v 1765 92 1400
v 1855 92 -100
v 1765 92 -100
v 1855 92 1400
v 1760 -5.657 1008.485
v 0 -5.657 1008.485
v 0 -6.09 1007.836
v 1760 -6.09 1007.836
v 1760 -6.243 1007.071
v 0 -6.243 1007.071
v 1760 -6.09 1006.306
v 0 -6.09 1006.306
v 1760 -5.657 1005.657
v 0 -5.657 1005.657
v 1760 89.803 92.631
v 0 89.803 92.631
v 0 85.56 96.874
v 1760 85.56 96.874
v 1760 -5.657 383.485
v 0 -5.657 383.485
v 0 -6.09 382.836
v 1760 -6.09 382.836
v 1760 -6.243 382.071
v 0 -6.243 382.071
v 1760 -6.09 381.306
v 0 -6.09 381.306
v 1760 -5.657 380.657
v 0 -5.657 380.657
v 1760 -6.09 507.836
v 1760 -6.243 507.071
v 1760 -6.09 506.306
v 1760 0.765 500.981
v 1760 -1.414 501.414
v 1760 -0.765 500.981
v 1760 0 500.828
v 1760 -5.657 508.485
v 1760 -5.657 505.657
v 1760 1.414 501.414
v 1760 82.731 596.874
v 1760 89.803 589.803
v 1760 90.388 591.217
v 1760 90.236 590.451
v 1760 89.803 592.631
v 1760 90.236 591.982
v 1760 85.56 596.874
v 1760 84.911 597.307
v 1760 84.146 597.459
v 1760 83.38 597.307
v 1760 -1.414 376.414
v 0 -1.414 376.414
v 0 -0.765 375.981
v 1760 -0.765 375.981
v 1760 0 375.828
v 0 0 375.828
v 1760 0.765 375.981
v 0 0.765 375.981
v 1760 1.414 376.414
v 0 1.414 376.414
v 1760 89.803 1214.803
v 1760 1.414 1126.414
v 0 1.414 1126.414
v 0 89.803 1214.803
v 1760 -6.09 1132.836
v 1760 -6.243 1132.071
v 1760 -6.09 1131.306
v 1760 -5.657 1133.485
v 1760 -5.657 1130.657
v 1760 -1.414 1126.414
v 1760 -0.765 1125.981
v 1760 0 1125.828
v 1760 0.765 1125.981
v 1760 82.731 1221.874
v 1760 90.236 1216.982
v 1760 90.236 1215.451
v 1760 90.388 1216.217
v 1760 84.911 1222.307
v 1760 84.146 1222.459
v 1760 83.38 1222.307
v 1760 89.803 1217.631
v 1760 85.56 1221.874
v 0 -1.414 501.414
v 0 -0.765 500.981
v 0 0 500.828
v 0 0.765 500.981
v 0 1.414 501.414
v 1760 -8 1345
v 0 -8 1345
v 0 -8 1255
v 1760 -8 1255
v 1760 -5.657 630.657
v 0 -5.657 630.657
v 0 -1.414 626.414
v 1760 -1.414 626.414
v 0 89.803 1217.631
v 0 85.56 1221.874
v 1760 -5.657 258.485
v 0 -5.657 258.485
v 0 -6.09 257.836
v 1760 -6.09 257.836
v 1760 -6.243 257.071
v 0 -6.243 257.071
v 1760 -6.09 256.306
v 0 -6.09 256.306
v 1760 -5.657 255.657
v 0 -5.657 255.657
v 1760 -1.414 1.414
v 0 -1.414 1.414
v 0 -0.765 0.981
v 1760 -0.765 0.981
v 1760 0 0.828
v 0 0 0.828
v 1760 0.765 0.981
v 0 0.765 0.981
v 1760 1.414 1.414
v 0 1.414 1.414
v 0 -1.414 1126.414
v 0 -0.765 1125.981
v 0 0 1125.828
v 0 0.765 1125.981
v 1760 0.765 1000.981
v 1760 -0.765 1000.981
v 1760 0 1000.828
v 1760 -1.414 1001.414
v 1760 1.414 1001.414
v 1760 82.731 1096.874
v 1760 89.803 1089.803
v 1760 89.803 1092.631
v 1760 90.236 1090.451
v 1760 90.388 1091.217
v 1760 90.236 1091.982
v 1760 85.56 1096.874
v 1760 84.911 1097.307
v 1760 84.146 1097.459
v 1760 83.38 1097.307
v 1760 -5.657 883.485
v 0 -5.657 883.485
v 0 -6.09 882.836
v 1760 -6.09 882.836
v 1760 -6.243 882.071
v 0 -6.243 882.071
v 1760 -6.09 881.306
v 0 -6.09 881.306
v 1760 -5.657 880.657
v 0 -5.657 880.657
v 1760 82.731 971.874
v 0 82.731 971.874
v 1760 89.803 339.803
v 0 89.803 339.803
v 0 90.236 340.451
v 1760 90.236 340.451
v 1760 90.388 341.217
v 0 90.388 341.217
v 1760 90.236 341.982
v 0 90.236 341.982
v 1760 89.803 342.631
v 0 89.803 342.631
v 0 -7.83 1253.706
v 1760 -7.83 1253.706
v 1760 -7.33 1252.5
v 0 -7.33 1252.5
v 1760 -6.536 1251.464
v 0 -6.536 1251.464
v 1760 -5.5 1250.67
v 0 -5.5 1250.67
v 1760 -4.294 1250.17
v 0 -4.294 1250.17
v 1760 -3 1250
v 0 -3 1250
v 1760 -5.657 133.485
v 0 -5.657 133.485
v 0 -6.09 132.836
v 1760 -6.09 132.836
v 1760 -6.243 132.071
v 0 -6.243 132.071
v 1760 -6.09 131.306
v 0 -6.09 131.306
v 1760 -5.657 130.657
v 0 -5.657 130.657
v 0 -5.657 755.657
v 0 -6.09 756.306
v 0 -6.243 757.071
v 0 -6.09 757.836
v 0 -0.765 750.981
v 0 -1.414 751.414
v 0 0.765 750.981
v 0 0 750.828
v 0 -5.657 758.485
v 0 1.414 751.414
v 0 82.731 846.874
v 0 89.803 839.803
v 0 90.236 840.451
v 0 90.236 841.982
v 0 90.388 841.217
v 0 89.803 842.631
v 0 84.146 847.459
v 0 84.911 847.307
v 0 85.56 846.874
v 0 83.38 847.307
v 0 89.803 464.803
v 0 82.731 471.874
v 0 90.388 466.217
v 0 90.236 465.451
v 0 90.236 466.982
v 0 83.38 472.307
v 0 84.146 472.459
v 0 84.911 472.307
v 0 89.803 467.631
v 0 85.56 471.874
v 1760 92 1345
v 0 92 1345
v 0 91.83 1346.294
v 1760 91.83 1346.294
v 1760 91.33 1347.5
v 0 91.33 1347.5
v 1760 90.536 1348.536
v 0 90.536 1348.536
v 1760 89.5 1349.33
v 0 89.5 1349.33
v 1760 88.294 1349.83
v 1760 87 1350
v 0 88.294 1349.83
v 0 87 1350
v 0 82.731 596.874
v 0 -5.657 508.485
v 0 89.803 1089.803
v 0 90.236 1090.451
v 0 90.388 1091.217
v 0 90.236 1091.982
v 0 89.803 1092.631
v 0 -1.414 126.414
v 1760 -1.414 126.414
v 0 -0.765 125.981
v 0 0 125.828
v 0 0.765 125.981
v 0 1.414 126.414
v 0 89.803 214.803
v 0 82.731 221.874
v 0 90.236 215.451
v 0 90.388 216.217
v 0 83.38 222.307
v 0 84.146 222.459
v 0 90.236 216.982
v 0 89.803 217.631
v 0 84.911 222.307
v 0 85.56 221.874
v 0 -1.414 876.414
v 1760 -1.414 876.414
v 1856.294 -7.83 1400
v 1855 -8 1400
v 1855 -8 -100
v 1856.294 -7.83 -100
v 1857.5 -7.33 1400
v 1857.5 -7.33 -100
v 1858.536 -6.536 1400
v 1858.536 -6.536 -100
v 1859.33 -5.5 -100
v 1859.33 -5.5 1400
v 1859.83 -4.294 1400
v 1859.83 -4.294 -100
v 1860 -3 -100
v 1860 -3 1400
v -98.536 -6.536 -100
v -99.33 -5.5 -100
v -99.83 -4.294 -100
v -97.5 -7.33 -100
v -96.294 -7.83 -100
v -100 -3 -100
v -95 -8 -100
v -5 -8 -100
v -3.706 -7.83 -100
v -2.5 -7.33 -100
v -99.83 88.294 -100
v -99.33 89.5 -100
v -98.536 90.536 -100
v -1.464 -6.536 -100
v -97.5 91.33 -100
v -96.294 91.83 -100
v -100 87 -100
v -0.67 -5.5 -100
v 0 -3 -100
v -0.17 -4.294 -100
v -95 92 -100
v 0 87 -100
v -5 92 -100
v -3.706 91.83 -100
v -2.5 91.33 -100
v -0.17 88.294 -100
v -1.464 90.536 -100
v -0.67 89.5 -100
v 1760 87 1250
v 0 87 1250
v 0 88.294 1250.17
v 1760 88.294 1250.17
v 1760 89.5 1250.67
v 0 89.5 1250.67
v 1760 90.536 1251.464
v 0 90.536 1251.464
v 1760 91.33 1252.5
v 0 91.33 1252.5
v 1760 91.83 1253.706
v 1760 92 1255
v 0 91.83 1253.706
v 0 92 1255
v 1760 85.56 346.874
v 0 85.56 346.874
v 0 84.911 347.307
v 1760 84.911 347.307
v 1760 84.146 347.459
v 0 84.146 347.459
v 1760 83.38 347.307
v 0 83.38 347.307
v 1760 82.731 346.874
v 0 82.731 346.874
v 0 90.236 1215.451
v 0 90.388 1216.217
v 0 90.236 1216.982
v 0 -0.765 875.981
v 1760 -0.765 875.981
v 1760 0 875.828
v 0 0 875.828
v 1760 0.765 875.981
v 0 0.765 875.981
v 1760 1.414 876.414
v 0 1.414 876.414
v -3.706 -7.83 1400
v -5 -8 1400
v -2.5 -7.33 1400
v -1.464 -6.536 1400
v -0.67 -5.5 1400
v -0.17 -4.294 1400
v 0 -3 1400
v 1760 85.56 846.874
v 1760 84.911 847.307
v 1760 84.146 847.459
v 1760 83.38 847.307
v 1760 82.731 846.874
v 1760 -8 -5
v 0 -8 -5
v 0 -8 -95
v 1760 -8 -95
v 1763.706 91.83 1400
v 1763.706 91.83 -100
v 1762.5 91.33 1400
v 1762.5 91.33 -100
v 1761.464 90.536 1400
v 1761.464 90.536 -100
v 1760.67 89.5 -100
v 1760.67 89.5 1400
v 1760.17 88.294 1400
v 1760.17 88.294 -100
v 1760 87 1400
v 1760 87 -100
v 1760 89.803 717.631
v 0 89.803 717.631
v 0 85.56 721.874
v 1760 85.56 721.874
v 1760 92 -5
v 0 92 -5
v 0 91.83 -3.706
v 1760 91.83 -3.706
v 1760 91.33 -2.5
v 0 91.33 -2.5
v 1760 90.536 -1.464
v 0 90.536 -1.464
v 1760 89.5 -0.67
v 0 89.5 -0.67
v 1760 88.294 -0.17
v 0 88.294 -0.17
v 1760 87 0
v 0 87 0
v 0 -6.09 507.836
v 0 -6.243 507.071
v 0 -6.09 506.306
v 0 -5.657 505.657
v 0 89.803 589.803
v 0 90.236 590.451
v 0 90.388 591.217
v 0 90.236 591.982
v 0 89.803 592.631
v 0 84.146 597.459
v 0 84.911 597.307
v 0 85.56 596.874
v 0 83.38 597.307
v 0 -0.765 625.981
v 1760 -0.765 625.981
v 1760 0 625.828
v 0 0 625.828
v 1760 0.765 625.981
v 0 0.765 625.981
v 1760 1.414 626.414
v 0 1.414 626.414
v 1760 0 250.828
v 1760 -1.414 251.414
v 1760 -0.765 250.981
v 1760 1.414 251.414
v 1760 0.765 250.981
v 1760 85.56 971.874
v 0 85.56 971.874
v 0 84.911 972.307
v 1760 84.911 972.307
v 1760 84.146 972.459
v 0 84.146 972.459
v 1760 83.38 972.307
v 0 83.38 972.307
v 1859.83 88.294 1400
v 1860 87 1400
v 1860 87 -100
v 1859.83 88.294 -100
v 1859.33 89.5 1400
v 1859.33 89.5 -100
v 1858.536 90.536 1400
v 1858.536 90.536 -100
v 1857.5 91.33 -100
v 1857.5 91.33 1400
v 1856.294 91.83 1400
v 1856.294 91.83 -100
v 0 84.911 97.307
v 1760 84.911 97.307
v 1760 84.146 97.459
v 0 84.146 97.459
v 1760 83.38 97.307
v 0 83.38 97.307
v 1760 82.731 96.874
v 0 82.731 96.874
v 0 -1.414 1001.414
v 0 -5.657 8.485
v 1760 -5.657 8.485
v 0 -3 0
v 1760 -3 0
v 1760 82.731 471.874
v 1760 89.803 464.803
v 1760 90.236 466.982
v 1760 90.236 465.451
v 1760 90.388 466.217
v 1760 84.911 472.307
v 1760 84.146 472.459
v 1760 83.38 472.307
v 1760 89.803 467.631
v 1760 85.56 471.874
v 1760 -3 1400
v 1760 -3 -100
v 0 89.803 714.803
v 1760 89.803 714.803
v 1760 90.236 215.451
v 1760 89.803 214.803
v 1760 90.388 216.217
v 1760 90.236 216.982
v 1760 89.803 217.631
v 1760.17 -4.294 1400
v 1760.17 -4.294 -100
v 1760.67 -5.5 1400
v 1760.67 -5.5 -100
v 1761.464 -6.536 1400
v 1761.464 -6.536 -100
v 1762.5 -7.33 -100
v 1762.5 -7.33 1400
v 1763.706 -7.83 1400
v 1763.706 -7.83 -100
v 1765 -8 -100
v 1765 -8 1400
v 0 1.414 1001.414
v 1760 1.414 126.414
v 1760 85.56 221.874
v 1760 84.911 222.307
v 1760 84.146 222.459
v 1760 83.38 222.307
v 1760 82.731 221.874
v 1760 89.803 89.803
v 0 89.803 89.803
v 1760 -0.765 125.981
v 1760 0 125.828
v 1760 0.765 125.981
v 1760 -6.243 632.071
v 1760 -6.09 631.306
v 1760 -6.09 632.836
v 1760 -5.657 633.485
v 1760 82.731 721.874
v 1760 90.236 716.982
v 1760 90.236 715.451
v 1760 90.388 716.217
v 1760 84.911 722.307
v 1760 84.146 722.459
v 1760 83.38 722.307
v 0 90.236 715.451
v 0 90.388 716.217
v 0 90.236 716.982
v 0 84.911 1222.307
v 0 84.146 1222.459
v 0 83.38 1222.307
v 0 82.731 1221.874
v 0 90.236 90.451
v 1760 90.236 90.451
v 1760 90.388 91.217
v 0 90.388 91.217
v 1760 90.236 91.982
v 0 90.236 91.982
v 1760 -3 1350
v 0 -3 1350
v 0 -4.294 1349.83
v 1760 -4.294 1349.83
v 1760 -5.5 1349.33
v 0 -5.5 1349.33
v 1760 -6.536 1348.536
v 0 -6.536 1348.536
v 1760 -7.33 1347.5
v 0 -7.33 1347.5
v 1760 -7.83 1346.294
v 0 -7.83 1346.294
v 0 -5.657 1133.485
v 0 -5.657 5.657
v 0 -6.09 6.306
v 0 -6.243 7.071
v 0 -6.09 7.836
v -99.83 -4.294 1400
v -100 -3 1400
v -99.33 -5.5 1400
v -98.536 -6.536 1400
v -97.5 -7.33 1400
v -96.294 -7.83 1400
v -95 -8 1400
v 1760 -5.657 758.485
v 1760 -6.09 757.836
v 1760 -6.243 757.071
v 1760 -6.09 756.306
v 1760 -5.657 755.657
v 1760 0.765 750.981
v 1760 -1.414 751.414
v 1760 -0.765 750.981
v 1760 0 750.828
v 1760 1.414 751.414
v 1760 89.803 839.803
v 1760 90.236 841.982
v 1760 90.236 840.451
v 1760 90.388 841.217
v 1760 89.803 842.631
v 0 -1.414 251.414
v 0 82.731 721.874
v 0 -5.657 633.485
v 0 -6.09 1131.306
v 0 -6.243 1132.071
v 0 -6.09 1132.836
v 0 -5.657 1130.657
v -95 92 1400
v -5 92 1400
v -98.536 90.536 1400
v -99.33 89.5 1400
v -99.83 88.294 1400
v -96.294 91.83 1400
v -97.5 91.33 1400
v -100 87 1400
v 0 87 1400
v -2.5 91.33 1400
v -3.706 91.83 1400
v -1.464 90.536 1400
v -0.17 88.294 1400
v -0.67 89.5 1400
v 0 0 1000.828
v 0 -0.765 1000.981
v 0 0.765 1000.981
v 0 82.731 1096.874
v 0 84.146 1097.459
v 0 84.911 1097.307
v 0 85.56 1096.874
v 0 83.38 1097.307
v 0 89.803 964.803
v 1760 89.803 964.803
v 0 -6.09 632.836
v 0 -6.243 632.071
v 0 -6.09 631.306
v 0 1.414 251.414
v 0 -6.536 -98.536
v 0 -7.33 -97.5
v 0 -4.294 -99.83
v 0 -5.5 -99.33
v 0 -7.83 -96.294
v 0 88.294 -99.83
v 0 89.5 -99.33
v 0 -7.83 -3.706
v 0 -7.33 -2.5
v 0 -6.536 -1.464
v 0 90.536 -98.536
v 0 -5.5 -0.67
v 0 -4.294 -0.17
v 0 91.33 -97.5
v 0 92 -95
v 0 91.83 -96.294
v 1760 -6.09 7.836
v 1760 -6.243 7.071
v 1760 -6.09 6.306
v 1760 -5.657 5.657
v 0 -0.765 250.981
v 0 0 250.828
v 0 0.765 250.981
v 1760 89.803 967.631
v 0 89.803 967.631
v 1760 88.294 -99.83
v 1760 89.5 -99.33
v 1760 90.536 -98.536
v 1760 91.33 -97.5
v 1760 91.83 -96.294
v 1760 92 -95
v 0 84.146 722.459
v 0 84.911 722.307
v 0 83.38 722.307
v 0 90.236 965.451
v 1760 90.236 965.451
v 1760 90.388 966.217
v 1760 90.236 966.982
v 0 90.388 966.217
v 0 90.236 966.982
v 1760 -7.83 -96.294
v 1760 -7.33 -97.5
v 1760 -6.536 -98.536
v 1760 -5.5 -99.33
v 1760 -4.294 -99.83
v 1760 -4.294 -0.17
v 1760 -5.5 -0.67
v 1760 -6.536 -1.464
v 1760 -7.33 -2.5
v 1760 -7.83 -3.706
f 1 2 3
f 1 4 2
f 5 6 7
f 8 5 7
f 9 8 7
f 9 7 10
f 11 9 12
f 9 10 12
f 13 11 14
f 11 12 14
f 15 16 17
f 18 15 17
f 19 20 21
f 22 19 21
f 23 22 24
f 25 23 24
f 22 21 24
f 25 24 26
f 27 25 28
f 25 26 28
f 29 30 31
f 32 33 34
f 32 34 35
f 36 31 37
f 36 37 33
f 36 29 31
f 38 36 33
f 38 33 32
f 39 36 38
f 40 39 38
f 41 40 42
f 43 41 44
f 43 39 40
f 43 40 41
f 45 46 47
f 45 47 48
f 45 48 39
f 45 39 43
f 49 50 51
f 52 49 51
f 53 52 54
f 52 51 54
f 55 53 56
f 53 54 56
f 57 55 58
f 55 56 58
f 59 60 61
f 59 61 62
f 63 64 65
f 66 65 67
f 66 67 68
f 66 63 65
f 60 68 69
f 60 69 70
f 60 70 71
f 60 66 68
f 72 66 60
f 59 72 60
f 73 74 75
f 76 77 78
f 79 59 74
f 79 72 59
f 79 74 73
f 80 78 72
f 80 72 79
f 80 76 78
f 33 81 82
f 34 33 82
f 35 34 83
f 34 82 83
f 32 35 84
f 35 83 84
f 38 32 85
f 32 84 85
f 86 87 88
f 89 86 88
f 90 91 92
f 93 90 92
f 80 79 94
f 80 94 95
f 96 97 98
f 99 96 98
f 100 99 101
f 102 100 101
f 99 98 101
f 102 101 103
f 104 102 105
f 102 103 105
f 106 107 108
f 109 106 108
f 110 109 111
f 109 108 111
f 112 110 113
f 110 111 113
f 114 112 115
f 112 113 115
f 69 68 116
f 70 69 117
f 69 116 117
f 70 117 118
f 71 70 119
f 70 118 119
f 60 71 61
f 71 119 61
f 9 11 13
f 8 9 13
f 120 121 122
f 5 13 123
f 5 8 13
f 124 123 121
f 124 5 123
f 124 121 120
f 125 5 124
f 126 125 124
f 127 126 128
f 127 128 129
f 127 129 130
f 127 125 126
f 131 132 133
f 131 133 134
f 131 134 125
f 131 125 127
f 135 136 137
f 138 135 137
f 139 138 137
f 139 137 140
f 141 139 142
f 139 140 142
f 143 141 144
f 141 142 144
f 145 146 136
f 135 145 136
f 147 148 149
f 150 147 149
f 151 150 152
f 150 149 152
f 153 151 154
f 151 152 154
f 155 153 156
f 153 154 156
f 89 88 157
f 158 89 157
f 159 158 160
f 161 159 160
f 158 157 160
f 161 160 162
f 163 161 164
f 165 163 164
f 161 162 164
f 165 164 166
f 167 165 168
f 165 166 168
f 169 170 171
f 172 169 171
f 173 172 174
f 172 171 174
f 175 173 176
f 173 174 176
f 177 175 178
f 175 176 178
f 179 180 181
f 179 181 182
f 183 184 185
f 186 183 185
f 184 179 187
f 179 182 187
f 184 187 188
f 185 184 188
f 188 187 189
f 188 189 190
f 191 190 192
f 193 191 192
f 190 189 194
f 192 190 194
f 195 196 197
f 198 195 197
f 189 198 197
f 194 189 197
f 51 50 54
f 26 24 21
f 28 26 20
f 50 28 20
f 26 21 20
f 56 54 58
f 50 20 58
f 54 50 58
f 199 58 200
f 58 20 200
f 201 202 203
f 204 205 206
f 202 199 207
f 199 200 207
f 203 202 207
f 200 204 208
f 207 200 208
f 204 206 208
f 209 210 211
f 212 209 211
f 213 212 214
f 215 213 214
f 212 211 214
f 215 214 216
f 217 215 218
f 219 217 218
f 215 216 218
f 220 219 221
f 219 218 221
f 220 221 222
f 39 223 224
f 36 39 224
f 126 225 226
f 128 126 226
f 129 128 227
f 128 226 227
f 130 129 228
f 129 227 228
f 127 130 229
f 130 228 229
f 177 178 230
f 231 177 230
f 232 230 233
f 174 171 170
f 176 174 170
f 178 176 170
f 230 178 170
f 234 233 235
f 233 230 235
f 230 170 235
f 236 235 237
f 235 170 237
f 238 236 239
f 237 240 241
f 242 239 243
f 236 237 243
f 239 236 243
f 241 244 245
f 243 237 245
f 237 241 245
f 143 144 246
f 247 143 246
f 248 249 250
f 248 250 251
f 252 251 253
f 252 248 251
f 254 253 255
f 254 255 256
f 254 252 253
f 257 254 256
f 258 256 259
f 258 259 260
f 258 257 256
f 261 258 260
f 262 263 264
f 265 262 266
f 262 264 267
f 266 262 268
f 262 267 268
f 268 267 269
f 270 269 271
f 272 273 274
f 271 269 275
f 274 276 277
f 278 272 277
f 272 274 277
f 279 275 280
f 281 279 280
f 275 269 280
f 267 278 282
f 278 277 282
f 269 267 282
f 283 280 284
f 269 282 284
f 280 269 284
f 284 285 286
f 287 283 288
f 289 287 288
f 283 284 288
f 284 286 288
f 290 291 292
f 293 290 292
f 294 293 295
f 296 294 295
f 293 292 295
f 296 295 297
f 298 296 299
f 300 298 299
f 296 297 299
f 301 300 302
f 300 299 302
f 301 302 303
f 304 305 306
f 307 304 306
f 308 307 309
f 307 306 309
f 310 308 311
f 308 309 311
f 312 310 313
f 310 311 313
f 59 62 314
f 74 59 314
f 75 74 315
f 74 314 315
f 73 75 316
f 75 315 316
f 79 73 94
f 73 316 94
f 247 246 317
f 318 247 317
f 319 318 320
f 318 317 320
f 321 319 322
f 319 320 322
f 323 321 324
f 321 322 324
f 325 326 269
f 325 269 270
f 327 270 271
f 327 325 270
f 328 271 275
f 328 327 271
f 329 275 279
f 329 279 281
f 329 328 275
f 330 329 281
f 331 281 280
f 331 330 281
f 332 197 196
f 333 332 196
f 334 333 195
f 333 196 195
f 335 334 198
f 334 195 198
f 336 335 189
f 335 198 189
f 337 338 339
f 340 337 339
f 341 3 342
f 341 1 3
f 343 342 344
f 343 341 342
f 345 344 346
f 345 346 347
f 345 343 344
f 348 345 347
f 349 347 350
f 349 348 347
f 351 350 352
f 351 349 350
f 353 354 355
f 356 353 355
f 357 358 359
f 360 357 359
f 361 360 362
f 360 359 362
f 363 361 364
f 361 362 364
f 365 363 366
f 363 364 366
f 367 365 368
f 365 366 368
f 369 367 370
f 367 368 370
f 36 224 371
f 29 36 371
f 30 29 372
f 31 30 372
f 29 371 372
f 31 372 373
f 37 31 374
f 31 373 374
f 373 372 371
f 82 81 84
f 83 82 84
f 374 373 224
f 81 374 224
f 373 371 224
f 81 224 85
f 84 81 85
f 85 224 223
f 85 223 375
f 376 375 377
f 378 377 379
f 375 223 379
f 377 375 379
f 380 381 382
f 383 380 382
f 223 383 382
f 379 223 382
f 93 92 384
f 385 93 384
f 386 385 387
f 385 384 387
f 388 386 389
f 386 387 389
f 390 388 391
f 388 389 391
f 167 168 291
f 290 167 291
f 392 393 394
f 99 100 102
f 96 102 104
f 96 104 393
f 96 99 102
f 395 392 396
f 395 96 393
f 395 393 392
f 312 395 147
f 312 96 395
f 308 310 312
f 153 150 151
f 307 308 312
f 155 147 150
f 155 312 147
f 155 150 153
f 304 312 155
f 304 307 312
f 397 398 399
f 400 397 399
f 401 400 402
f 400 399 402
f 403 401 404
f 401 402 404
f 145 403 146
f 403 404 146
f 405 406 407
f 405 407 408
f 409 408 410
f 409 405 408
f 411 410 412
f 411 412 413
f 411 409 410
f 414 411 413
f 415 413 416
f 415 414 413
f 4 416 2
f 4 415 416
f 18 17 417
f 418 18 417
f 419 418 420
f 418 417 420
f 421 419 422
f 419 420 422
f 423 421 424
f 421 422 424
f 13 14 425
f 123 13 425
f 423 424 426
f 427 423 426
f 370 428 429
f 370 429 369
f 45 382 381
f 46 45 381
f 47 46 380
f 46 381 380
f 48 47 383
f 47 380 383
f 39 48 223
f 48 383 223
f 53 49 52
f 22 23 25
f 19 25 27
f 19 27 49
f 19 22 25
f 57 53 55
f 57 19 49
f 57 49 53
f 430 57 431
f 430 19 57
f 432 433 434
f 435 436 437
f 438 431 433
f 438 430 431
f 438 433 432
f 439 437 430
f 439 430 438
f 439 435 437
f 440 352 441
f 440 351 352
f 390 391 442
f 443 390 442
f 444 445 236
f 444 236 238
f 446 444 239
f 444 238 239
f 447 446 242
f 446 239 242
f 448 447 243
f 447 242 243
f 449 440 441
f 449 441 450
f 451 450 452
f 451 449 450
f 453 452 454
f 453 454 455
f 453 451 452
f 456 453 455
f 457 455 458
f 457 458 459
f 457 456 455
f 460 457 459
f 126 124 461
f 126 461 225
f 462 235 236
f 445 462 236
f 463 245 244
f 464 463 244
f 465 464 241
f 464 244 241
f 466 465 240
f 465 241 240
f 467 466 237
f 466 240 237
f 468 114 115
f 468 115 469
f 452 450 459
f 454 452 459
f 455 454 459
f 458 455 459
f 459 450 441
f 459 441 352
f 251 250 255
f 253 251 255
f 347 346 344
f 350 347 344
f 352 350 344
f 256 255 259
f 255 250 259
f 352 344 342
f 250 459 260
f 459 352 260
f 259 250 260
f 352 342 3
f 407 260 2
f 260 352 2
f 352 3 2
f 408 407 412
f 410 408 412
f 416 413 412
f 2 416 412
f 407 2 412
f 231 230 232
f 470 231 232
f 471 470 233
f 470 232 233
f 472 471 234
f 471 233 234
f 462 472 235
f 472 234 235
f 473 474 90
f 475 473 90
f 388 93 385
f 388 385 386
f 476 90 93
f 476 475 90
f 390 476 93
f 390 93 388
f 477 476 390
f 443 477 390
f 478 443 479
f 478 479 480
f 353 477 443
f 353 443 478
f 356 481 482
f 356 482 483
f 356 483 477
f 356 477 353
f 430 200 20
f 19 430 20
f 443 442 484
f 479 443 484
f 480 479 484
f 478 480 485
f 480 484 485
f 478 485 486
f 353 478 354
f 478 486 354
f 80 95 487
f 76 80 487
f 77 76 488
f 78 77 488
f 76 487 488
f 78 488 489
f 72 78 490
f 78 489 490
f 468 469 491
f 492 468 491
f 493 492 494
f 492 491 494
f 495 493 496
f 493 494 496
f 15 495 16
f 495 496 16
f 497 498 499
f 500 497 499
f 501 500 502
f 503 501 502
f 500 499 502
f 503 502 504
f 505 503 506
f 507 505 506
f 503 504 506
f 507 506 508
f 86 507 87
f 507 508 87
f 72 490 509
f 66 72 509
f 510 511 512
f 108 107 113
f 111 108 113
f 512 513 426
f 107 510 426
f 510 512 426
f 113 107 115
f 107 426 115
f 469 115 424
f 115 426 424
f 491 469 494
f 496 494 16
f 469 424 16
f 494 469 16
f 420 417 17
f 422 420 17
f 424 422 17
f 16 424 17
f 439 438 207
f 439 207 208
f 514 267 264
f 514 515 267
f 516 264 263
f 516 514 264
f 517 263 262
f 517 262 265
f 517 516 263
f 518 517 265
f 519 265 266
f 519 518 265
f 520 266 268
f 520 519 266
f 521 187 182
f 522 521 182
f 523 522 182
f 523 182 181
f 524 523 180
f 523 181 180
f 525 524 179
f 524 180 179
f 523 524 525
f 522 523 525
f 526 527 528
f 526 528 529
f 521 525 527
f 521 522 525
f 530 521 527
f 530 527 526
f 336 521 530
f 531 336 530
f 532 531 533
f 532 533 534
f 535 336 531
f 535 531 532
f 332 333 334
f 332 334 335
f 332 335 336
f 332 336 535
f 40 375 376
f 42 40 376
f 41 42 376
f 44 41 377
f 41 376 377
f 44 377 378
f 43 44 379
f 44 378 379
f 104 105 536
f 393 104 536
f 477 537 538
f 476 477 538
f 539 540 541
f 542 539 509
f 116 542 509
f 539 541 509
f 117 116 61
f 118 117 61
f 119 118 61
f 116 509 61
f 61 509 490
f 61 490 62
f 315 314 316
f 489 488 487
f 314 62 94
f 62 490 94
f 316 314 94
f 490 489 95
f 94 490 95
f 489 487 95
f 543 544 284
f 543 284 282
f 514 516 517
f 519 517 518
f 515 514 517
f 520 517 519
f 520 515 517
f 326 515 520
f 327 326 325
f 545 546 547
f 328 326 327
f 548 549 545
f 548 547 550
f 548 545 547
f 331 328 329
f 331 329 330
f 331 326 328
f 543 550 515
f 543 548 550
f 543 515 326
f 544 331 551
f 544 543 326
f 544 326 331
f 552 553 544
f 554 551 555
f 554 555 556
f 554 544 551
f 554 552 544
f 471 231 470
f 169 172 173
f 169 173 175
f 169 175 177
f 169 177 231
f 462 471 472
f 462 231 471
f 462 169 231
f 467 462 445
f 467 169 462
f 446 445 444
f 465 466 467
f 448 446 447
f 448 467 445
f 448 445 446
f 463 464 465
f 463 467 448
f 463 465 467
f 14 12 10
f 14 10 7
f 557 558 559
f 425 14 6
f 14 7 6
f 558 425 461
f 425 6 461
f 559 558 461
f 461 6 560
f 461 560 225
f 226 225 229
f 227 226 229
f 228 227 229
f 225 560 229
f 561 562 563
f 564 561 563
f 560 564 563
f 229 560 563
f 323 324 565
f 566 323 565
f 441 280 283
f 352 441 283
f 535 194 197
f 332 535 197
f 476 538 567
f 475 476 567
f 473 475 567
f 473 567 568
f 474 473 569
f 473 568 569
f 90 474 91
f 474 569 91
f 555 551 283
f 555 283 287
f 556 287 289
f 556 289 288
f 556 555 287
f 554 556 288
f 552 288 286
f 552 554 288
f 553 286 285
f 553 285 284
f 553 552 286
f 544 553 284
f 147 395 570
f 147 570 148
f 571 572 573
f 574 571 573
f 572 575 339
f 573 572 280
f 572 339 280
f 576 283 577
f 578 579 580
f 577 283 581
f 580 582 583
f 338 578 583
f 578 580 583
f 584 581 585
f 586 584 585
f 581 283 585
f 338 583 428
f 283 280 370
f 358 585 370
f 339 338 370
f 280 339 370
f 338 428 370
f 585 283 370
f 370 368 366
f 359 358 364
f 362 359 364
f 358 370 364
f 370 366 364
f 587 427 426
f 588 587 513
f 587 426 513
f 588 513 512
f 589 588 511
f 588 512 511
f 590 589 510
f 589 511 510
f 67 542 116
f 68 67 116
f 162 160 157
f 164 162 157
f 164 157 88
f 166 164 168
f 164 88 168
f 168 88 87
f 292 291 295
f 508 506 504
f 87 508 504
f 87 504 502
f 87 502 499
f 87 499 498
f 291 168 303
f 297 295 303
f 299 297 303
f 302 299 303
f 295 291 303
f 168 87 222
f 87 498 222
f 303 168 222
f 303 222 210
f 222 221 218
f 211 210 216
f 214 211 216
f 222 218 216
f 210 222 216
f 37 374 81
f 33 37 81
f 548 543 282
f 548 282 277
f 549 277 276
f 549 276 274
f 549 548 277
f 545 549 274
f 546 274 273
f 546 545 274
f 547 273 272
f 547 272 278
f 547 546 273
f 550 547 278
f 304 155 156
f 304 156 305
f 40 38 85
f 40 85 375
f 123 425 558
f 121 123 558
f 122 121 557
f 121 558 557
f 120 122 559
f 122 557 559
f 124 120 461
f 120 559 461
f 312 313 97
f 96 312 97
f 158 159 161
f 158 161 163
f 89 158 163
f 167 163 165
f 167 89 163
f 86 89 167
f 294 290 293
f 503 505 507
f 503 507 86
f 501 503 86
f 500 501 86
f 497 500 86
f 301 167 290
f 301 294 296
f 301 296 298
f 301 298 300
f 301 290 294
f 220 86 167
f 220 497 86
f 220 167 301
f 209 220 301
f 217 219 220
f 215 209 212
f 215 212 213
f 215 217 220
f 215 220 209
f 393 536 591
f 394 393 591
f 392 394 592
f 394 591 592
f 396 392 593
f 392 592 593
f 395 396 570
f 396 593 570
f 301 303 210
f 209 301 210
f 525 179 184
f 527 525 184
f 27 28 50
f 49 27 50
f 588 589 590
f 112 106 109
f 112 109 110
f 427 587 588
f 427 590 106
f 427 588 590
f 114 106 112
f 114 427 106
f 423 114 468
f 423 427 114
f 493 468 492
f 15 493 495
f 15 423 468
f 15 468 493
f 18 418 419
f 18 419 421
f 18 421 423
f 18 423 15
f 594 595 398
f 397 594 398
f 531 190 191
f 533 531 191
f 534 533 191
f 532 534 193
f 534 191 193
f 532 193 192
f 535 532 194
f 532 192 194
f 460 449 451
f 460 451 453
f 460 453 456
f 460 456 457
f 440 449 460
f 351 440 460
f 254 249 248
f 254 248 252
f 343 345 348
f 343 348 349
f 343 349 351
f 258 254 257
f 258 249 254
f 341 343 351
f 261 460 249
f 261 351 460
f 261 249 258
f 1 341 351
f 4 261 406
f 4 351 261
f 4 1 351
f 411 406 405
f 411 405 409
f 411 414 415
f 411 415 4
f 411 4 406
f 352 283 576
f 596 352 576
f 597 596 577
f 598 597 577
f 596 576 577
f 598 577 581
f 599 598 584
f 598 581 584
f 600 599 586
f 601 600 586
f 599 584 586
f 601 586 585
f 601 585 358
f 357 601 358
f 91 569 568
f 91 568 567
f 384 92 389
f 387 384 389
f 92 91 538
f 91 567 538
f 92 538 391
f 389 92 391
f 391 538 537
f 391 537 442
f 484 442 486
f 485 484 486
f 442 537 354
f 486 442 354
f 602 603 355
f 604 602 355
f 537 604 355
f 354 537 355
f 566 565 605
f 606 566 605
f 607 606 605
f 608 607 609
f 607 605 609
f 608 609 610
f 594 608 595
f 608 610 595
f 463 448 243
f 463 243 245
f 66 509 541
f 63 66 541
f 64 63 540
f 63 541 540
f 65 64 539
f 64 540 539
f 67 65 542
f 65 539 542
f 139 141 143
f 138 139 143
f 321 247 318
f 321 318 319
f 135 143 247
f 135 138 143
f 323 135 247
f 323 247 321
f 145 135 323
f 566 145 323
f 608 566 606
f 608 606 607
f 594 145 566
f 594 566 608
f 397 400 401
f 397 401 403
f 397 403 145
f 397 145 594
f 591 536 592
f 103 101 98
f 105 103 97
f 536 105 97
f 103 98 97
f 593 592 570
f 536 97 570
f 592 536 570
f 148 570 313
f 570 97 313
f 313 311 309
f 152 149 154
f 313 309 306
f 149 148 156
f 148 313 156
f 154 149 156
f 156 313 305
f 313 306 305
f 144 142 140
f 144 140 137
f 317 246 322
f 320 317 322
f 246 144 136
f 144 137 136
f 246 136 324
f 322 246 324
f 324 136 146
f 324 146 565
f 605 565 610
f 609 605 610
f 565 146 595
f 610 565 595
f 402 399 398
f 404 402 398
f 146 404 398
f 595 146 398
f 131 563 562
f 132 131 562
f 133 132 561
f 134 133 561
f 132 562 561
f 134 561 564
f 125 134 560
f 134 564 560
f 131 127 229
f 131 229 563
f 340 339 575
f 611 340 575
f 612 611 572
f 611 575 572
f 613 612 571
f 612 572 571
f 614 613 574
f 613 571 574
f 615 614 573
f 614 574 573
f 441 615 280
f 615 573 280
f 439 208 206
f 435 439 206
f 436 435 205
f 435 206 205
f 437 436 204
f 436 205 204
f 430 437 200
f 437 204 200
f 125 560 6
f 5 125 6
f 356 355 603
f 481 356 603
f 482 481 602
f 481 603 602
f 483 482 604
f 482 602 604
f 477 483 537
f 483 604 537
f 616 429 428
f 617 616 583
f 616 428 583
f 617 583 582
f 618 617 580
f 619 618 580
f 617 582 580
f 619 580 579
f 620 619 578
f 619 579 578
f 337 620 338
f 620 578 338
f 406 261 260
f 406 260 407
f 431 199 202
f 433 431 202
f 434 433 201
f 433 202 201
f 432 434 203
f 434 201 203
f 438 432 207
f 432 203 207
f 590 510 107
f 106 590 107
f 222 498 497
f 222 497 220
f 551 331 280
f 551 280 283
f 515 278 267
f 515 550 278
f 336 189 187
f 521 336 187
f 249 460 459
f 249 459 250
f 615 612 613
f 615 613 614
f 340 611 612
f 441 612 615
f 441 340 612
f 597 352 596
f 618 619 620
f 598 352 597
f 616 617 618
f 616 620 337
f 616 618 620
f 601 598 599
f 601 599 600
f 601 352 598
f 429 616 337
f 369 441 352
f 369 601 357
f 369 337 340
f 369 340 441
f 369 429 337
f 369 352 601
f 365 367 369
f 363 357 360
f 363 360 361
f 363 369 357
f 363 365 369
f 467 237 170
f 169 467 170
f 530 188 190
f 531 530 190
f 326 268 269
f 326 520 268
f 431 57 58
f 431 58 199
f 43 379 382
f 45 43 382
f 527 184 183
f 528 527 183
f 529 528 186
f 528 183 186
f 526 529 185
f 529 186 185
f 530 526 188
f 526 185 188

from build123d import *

# Parameters (mm, degrees)
F1_DEPTH      = 1760
F3_DEPTH      = 1400
F3_DEPTH_BACK = 100
F4_W          = 90
F4_H          = 100
F5_DEPTH      = 1760


# Not quite as in the source:
# - a feature names something its author has since deleted; it is built from what else it names


with BuildPart() as f1:
    # F0 (on Right) → F1 (new body)
    with BuildSketch(Plane.YZ):
        with BuildLine():
            ThreePointArc((-1.4142135624, 1.4142135624), (0, 0.8284271247), (1.4142135624, 1.4142135624))
            Line((1.4142135624, 1.4142135624), (89.8025612107, 89.8025612107))
            ThreePointArc((89.8025612107, 89.8025612107), (90.3883476483, 91.2167747731), (89.8025612107, 92.6309883354))
            Line((89.8025612107, 92.6309883354), (85.5599205236, 96.8736290226))
            ThreePointArc((85.5599205236, 96.8736290226), (84.1457069612, 97.4594154602), (82.7314933988, 96.8736290226))
            Line((82.7314933988, 96.8736290226), (-5.6568542495, 8.4852813742))
            ThreePointArc((-5.6568542495, 8.4852813742), (-6.2426406871, 7.0710678119), (-5.6568542495, 5.6568542495))
            Line((-5.6568542495, 5.6568542495), (-1.4142135624, 1.4142135624))
        make_face()
    extrude(amount=F1_DEPTH)


with BuildPart() as f1b:
    # F0 (on Right) → F1, piece 2 (new body)
    with BuildSketch(Plane.YZ):
        with BuildLine():
            ThreePointArc((-1.4142135624, 126.4142135624), (0, 125.8284271247), (1.4142135624, 126.4142135624))
            Line((1.4142135624, 126.4142135624), (89.8025612107, 214.8025612107))
            ThreePointArc((89.8025612107, 214.8025612107), (90.3883476483, 216.2167747731), (89.8025612107, 217.6309883354))
            Line((89.8025612107, 217.6309883354), (85.5599205236, 221.8736290226))
            ThreePointArc((85.5599205236, 221.8736290226), (84.1457069612, 222.4594154602), (82.7314933988, 221.8736290226))
            Line((82.7314933988, 221.8736290226), (-5.6568542495, 133.4852813742))
            ThreePointArc((-5.6568542495, 133.4852813742), (-6.2426406871, 132.0710678119), (-5.6568542495, 130.6568542495))
            Line((-5.6568542495, 130.6568542495), (-1.4142135624, 126.4142135624))
        make_face()
    extrude(amount=F1_DEPTH)


with BuildPart() as f1c:
    # F0 (on Right) → F1, piece 3 (new body)
    with BuildSketch(Plane.YZ):
        with BuildLine():
            ThreePointArc((-1.4142135624, 251.4142135624), (0, 250.8284271247), (1.4142135624, 251.4142135624))
            Line((1.4142135624, 251.4142135624), (89.8025612107, 339.8025612107))
            ThreePointArc((89.8025612107, 339.8025612107), (90.3883476483, 341.2167747731), (89.8025612107, 342.6309883354))
            Line((89.8025612107, 342.6309883354), (85.5599205236, 346.8736290226))
            ThreePointArc((85.5599205236, 346.8736290226), (84.1457069612, 347.4594154602), (82.7314933988, 346.8736290226))
            Line((82.7314933988, 346.8736290226), (-5.6568542495, 258.4852813742))
            ThreePointArc((-5.6568542495, 258.4852813742), (-6.2426406871, 257.0710678119), (-5.6568542495, 255.6568542495))
            Line((-5.6568542495, 255.6568542495), (-1.4142135624, 251.4142135624))
        make_face()
    extrude(amount=F1_DEPTH)


with BuildPart() as f1d:
    # F0 (on Right) → F1, piece 4 (new body)
    with BuildSketch(Plane.YZ):
        with BuildLine():
            ThreePointArc((-1.4142135624, 376.4142135624), (0, 375.8284271247), (1.4142135624, 376.4142135624))
            Line((1.4142135624, 376.4142135624), (89.8025612107, 464.8025612107))
            ThreePointArc((89.8025612107, 464.8025612107), (90.3883476483, 466.2167747731), (89.8025612107, 467.6309883354))
            Line((89.8025612107, 467.6309883354), (85.5599205236, 471.8736290226))
            ThreePointArc((85.5599205236, 471.8736290226), (84.1457069612, 472.4594154602), (82.7314933988, 471.8736290226))
            Line((82.7314933988, 471.8736290226), (-5.6568542495, 383.4852813742))
            ThreePointArc((-5.6568542495, 383.4852813742), (-6.2426406871, 382.0710678119), (-5.6568542495, 380.6568542495))
            Line((-5.6568542495, 380.6568542495), (-1.4142135624, 376.4142135624))
        make_face()
    extrude(amount=F1_DEPTH)


with BuildPart() as f1e:
    # F0 (on Right) → F1, piece 5 (new body)
    with BuildSketch(Plane.YZ):
        with BuildLine():
            ThreePointArc((-1.4142135624, 501.4142135624), (0, 500.8284271247), (1.4142135624, 501.4142135624))
            Line((1.4142135624, 501.4142135624), (89.8025612107, 589.8025612107))
            ThreePointArc((89.8025612107, 589.8025612107), (90.3883476483, 591.2167747731), (89.8025612107, 592.6309883354))
            Line((89.8025612107, 592.6309883354), (85.5599205236, 596.8736290226))
            ThreePointArc((85.5599205236, 596.8736290226), (84.1457069612, 597.4594154602), (82.7314933988, 596.8736290226))
            Line((82.7314933988, 596.8736290226), (-5.6568542495, 508.4852813742))
            ThreePointArc((-5.6568542495, 508.4852813742), (-6.2426406871, 507.0710678119), (-5.6568542495, 505.6568542495))
            Line((-5.6568542495, 505.6568542495), (-1.4142135624, 501.4142135624))
        make_face()
    extrude(amount=F1_DEPTH)


with BuildPart() as f1f:
    # F0 (on Right) → F1, piece 6 (new body)
    with BuildSketch(Plane.YZ):
        with BuildLine():
            ThreePointArc((-1.4142135624, 626.4142135624), (0, 625.8284271247), (1.4142135624, 626.4142135624))
            Line((1.4142135624, 626.4142135624), (89.8025612107, 714.8025612107))
            ThreePointArc((89.8025612107, 714.8025612107), (90.3883476483, 716.2167747731), (89.8025612107, 717.6309883354))
            Line((89.8025612107, 717.6309883354), (85.5599205236, 721.8736290226))
            ThreePointArc((85.5599205236, 721.8736290226), (84.1457069612, 722.4594154602), (82.7314933988, 721.8736290226))
            Line((82.7314933988, 721.8736290226), (-5.6568542495, 633.4852813742))
            ThreePointArc((-5.6568542495, 633.4852813742), (-6.2426406871, 632.0710678119), (-5.6568542495, 630.6568542495))
            Line((-5.6568542495, 630.6568542495), (-1.4142135624, 626.4142135624))
        make_face()
    extrude(amount=F1_DEPTH)


with BuildPart() as f1g:
    # F0 (on Right) → F1, piece 7 (new body)
    with BuildSketch(Plane.YZ):
        with BuildLine():
            ThreePointArc((-1.4142135624, 751.4142135624), (0, 750.8284271247), (1.4142135624, 751.4142135624))
            Line((1.4142135624, 751.4142135624), (89.8025612107, 839.8025612107))
            ThreePointArc((89.8025612107, 839.8025612107), (90.3883476483, 841.2167747731), (89.8025612107, 842.6309883354))
            Line((89.8025612107, 842.6309883354), (85.5599205236, 846.8736290226))
            ThreePointArc((85.5599205236, 846.8736290226), (84.1457069612, 847.4594154602), (82.7314933988, 846.8736290226))
            Line((82.7314933988, 846.8736290226), (-5.6568542495, 758.4852813742))
            ThreePointArc((-5.6568542495, 758.4852813742), (-6.2426406871, 757.0710678119), (-5.6568542495, 755.6568542495))
            Line((-5.6568542495, 755.6568542495), (-1.4142135624, 751.4142135624))
        make_face()
    extrude(amount=F1_DEPTH)


with BuildPart() as f1h:
    # F0 (on Right) → F1, piece 8 (new body)
    with BuildSketch(Plane.YZ):
        with BuildLine():
            ThreePointArc((-1.4142135624, 876.4142135624), (0, 875.8284271247), (1.4142135624, 876.4142135624))
            Line((1.4142135624, 876.4142135624), (89.8025612107, 964.8025612107))
            ThreePointArc((89.8025612107, 964.8025612107), (90.3883476483, 966.2167747731), (89.8025612107, 967.6309883354))
            Line((89.8025612107, 967.6309883354), (85.5599205236, 971.8736290226))
            ThreePointArc((85.5599205236, 971.8736290226), (84.1457069612, 972.4594154602), (82.7314933988, 971.8736290226))
            Line((82.7314933988, 971.8736290226), (-5.6568542495, 883.4852813742))
            ThreePointArc((-5.6568542495, 883.4852813742), (-6.2426406871, 882.0710678119), (-5.6568542495, 880.6568542495))
            Line((-5.6568542495, 880.6568542495), (-1.4142135624, 876.4142135624))
        make_face()
    extrude(amount=F1_DEPTH)


with BuildPart() as f1i:
    # F0 (on Right) → F1, piece 9 (new body)
    with BuildSketch(Plane.YZ):
        with BuildLine():
            ThreePointArc((-1.4142135624, 1001.4142135624), (0, 1000.8284271247), (1.4142135624, 1001.4142135624))
            Line((1.4142135624, 1001.4142135624), (89.8025612107, 1089.8025612107))
            ThreePointArc((89.8025612107, 1089.8025612107), (90.3883476483, 1091.2167747731), (89.8025612107, 1092.6309883354))
            Line((89.8025612107, 1092.6309883354), (85.5599205236, 1096.8736290226))
            ThreePointArc((85.5599205236, 1096.8736290226), (84.1457069612, 1097.4594154602), (82.7314933988, 1096.8736290226))
            Line((82.7314933988, 1096.8736290226), (-5.6568542495, 1008.4852813742))
            ThreePointArc((-5.6568542495, 1008.4852813742), (-6.2426406871, 1007.0710678119), (-5.6568542495, 1005.6568542495))
            Line((-5.6568542495, 1005.6568542495), (-1.4142135624, 1001.4142135624))
        make_face()
    extrude(amount=F1_DEPTH)


with BuildPart() as f1j:
    # F0 (on Right) → F1, piece 10 (new body)
    with BuildSketch(Plane.YZ):
        with BuildLine():
            ThreePointArc((-1.4142135624, 1126.4142135624), (0, 1125.8284271247), (1.4142135624, 1126.4142135624))
            Line((1.4142135624, 1126.4142135624), (89.8025612107, 1214.8025612107))
            ThreePointArc((89.8025612107, 1214.8025612107), (90.3883476483, 1216.2167747731), (89.8025612107, 1217.6309883354))
            Line((89.8025612107, 1217.6309883354), (85.5599205236, 1221.8736290226))
            ThreePointArc((85.5599205236, 1221.8736290226), (84.1457069612, 1222.4594154602), (82.7314933988, 1221.8736290226))
            Line((82.7314933988, 1221.8736290226), (-5.6568542495, 1133.4852813742))
            ThreePointArc((-5.6568542495, 1133.4852813742), (-6.2426406871, 1132.0710678119), (-5.6568542495, 1130.6568542495))
            Line((-5.6568542495, 1130.6568542495), (-1.4142135624, 1126.4142135624))
        make_face()
    extrude(amount=F1_DEPTH)


with BuildPart() as f3:
    # F2 (on Top) → F3 (new body, two sides)
    with BuildSketch(Plane.XY) as f3_sk:
        with BuildLine():
            Line((-95, -8), (-5, -8))
            ThreePointArc((-5, -8), (-1.4644660941, -6.5355339059), (0, -3))
            Line((0, -3), (0, 87))
            ThreePointArc((0, 87), (-1.4644660941, 90.5355339059), (-5, 92))
            Line((-5, 92), (-95, 92))
            ThreePointArc((-95, 92), (-98.5355339059, 90.5355339059), (-100, 87))
            Line((-100, 87), (-100, -3))
            ThreePointArc((-100, -3), (-98.5355339059, -6.5355339059), (-95, -8))
        make_face()
    extrude(amount=F3_DEPTH)
    extrude(f3_sk.sketch, amount=-F3_DEPTH_BACK)


with BuildPart() as f3b:
    # F2 (on Top) → F3, piece 2 (new body, two sides)
    with BuildSketch(Plane.XY) as f3_2_sk:
        with BuildLine():
            Line((1760, 87), (1760, -3))
            ThreePointArc((1760, -3), (1761.4644660941, -6.5355339059), (1765, -8))
            Line((1765, -8), (1855, -8))
            ThreePointArc((1855, -8), (1858.5355339059, -6.5355339059), (1860, -3))
            Line((1860, -3), (1860, 87))
            ThreePointArc((1860, 87), (1858.5355339059, 90.5355339059), (1855, 92))
            Line((1855, 92), (1765, 92))
            ThreePointArc((1765, 92), (1761.4644660941, 90.5355339059), (1760, 87))
        make_face()
    extrude(amount=F3_DEPTH)
    extrude(f3_2_sk.sketch, amount=-F3_DEPTH_BACK)


with BuildPart() as f5:
    # F4 (on face) → F5 (new body)
    with BuildSketch(Plane.YZ):
        with Locations((42, 1300)):
            Rectangle(F4_W, F4_H)
        with BuildLine():
            ThreePointArc((-8, 1255), (-6.5355339059, 1251.4644660941), (-3, 1250))
            Line((-3, 1250), (-3, 1350))
            ThreePointArc((-3, 1350), (-6.5355339059, 1348.5355339059), (-8, 1345))
            Line((-8, 1345), (-8, 1255))
        make_face()
        with BuildLine():
            Line((87, 1350), (87, 1250))
            ThreePointArc((87, 1250), (90.5355339059, 1251.4644660941), (92, 1255))
            Line((92, 1255), (92, 1345))
            ThreePointArc((92, 1345), (90.5355339059, 1348.5355339059), (87, 1350))
        make_face()
    extrude(amount=F5_DEPTH)


with BuildPart() as f5b:
    # F4 (on face) → F5, piece 2 (new body)
    with BuildSketch(Plane.YZ):
        with Locations((42, -50)):
            Rectangle(F4_W, F4_H)
        with BuildLine():
            ThreePointArc((-8, -95), (-6.5355339059, -98.5355339059), (-3, -100))
            Line((-3, -100), (-3, 0))
            ThreePointArc((-3, 0), (-6.5355339059, -1.4644660941), (-8, -5))
            Line((-8, -5), (-8, -95))
        make_face()
        with BuildLine():
            Line((87, 0), (87, -100))
            ThreePointArc((87, -100), (90.5355339059, -98.5355339059), (92, -95))
            Line((92, -95), (92, -5))
            ThreePointArc((92, -5), (90.5355339059, -1.4644660941), (87, 0))
        make_face()
    extrude(amount=F5_DEPTH)


solid = Compound([f1.part, f1b.part, f1c.part, f1d.part, f1e.part, f1f.part, f1g.part, f1h.part, f1i.part, f1j.part, f3.part, f3b.part, f5.part, f5b.part])
